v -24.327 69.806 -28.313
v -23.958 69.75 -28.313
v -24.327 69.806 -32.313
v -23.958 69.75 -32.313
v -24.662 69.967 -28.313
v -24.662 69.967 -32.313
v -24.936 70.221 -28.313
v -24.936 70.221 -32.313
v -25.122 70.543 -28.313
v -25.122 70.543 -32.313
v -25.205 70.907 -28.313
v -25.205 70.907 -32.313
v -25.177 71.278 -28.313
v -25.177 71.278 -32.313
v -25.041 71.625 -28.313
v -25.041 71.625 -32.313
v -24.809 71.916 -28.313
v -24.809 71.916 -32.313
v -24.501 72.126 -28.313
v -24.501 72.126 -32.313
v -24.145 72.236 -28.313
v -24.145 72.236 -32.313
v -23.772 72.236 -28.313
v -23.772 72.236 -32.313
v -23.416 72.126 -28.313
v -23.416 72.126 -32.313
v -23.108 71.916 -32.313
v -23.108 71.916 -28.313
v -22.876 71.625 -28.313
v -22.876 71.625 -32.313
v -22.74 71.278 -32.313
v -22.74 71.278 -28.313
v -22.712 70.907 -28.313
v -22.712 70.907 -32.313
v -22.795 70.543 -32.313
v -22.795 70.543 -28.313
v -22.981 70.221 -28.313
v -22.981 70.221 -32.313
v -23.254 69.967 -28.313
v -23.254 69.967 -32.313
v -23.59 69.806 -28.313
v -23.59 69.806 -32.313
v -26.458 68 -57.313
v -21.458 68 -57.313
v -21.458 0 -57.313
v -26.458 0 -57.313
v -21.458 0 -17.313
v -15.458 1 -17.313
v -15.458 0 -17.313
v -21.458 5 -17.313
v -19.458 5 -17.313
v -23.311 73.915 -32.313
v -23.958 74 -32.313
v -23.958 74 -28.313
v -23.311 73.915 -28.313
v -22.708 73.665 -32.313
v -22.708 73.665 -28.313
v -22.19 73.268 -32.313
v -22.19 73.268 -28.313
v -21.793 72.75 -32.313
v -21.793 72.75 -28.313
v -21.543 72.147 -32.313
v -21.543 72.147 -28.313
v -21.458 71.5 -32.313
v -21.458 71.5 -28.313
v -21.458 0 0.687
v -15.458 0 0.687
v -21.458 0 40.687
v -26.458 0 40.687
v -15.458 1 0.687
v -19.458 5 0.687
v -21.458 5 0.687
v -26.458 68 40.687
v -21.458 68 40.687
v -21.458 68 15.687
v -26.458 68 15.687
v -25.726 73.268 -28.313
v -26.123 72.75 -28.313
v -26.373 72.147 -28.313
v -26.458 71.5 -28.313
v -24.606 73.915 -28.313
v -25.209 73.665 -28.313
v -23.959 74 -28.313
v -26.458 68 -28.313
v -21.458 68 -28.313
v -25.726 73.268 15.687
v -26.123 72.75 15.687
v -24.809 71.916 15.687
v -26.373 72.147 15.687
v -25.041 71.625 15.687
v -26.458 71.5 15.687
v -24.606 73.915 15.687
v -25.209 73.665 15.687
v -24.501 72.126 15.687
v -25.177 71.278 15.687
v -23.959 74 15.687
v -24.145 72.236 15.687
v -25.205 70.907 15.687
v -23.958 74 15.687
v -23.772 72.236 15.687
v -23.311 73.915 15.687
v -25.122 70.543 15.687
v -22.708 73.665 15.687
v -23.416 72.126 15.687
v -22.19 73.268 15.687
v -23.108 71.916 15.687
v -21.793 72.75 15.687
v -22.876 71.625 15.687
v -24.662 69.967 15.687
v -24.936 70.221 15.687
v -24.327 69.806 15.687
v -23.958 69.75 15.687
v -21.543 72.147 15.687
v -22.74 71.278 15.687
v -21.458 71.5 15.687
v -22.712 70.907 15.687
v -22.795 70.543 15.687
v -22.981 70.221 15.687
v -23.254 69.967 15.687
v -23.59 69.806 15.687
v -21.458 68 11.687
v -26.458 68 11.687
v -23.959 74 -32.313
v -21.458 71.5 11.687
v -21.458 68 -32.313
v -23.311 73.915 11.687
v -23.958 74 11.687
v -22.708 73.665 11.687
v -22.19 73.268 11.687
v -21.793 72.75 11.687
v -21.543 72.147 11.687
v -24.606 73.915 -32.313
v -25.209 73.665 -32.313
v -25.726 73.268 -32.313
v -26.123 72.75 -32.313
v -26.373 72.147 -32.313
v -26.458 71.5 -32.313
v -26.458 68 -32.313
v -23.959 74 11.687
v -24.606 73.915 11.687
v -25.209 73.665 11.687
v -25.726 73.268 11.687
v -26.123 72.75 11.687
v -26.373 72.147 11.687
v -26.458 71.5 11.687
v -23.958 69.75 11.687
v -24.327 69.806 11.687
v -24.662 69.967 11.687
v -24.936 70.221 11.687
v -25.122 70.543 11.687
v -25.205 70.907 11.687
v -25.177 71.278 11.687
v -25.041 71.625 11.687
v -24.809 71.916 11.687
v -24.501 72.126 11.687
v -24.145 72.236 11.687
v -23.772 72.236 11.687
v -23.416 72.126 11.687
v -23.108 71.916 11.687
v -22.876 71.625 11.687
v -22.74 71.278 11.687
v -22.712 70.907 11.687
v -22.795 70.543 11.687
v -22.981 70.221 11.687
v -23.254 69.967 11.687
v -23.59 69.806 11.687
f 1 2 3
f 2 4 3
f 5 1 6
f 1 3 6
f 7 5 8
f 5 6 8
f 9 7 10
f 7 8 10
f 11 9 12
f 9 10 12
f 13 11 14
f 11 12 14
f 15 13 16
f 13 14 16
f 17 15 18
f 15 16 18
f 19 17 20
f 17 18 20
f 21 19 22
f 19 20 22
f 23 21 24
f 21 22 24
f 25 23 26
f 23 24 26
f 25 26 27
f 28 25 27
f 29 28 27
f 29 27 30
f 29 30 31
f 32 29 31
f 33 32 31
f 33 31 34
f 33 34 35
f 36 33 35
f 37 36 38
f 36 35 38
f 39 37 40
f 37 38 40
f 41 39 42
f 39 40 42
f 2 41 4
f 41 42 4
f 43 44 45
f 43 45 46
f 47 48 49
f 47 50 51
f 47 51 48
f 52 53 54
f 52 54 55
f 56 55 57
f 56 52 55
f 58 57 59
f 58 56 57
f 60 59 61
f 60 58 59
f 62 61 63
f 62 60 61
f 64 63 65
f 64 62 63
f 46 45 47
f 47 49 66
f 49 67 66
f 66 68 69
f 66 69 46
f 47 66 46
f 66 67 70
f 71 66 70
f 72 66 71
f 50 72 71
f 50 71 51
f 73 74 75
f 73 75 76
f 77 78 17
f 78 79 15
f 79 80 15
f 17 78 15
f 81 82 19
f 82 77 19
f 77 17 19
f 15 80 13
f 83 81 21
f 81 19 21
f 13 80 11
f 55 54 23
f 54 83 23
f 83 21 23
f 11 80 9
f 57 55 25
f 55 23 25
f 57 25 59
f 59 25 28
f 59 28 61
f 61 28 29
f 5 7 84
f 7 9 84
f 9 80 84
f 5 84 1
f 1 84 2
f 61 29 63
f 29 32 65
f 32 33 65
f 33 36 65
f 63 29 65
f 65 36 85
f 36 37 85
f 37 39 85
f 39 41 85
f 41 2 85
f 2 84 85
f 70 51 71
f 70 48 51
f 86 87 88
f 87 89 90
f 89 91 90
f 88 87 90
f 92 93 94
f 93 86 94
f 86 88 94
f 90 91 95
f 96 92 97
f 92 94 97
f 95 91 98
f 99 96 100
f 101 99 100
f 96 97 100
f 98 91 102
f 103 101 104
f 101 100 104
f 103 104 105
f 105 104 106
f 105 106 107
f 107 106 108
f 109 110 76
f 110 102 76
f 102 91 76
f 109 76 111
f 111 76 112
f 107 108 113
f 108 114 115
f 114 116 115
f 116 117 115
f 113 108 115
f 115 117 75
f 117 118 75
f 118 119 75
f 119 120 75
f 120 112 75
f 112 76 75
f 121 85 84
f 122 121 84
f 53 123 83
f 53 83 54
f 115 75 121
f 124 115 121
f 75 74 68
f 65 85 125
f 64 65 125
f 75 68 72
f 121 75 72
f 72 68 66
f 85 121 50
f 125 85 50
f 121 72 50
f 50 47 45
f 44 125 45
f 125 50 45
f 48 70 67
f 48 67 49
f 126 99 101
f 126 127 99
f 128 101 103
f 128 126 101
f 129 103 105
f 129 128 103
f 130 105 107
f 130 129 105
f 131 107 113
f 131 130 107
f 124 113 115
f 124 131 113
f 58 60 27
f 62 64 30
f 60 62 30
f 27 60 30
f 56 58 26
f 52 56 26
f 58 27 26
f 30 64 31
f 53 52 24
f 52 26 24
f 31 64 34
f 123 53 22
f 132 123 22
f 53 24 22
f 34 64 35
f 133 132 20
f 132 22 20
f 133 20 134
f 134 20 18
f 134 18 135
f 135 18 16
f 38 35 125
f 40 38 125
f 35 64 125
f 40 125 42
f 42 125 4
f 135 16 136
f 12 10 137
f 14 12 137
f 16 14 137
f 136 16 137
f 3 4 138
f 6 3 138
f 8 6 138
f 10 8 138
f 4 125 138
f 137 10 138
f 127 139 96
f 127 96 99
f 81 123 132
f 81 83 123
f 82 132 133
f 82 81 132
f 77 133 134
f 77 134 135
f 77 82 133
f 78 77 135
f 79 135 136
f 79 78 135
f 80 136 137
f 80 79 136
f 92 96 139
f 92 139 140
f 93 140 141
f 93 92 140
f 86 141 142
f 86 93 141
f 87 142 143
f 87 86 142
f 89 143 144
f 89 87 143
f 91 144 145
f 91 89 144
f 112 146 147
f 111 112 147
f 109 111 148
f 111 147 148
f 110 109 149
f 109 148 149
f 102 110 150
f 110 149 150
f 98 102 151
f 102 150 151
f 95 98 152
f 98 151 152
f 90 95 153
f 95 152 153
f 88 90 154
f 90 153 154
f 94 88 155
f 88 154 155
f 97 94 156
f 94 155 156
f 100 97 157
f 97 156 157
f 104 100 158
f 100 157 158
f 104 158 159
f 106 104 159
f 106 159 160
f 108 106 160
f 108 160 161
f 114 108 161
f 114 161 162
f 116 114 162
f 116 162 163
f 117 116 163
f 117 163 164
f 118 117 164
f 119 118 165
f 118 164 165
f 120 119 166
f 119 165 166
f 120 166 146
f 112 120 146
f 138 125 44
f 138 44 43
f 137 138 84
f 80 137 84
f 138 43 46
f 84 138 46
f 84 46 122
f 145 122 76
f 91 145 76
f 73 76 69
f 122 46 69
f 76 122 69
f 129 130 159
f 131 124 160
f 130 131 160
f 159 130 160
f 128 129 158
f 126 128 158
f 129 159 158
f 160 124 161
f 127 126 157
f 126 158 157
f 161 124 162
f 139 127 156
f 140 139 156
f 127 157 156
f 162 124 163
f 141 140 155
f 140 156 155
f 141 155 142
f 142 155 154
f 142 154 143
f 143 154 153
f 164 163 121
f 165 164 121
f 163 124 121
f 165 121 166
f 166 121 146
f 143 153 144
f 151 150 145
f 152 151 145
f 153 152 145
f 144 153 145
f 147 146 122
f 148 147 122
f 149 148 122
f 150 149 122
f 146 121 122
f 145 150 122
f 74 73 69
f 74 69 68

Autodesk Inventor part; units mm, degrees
ref_plane "YZ Plane" through (0, 0, 0) normal (1, 0, 0) x (0, 1, 0)
ref_plane "XZ Plane" through (0, 0, 0) normal (0, 1, 0) x (-1, 0, 0)
ref_plane "XY Plane" through (0, 0, 0) normal (0, 0, 1) x (1, 0, 0)
sketch "Sketch1" plane through (0, 0, 0) normal (0, 1, 0) x (-1, 0, 0)
  line L0 (42.3333, 428.0371) -> (37.3333, 428.0371)
  line L1 (37.3333, 428.0371) -> (37.3333, 330.0371)
  line L2 (37.3333, 330.0371) -> (42.3333, 330.0371)
  line L3 (42.3333, 330.0371) -> (42.3333, 428.0371)
  point P0 (0, 0)
  dimension "d0" = 5
  dimension "d1" = 98
extrude "Extrusion1" add sketch "Sketch1" along normal blind 68
move or copy body "Move Body1" bodies to move or copy 1 copy no translate (15.875, -14.288, -387.35)
sketch "Sketch2" plane through (0, 68, 0) normal (0, 1, 0) x (1, 0, 0)
  line L0 (-26.4583, 57.3129) -> (-26.4583, -40.6871) projected
  line L1 (-21.4583, -40.6871) -> (-21.4583, 57.3129) projected
  line L2 (-26.4583, -15.6871) -> (-21.4583, -15.6871)
  line L3 (-21.4583, -15.6871) -> (-21.4583, -11.6871)
  line L4 (-21.4583, -11.6871) -> (-26.4583, -11.6871)
  line L5 (-26.4583, -11.6871) -> (-26.4583, -15.6871)
  line L6 (-26.4583, 28.3129) -> (-21.4583, 28.3129)
  line L7 (-21.4583, 28.3129) -> (-21.4583, 32.3129)
  line L8 (-21.4583, 32.3129) -> (-26.4583, 32.3129)
  line L9 (-26.4583, 32.3129) -> (-26.4583, 28.3129)
  line L10 (-26.4583, -40.6871) -> (-21.4583, -40.6871) projected
  line L11 (-21.4583, 57.3129) -> (-26.4583, 57.3129) projected
  line L12 (-21.4583, -40.6871) -> (-22.4583, -40.6871)
  line L13 (-22.4583, -40.6871) -> (-22.4583, 57.3129)
  line L14 (-22.4583, 57.3129) -> (-21.4583, 57.3129)
  line L15 (-21.4583, 57.3129) -> (-21.4583, -40.6871)
  point P0 (0, 0)
  point P1 (-26.4583, 32.3129)
  point P2 (-26.4583, 28.3129)
  point P3 (-26.4583, -11.6871)
  dimension "d7" = 29
  dimension "d8" = 29
  dimension "d9" = 25
  dimension "d10" = 25
  dimension "d26" = 1
move or copy body "Move Body2" bodies to move or copy 1 copy no translate (0, 14.288, 0)
extrude "Extrusion2" add sketch "Sketch2" along normal blind 6 contours L8 L13 L6 L0 | L8 L1 L6 L13 | L4 L13 L2 L0 | L4 L1 L2 L13
sketch "Sketch4" plane through (-26.4583, 68, 15.6871) normal (0, 0, 1) x (1, 0, 0)
  line L0 (0, 6) -> (5, 6) projected
  line L1 (5, 0) -> (5, 6) projected
  point P0 (26.4583, -68)
  point P1 (2.5, 3)
  dimension "d17" = 3
  dimension "d18" = 2.5
hole "Hole1" at (-23.9583, 71, 15.6871) direction (0, 0, -1) diameter 2.5 end through all
sketch "Sketch5" plane through (-21.4583, 0, 40.6871) normal (1, 0, 0) x (0, 0, -1)
  line L0 (40, 5) -> (58, 5)
  line L1 (58, 5) -> (58, 0)
  line L2 (58, 0) -> (40, 0)
  line L3 (40, 0) -> (40, 5)
  line L4 (0, 0) -> (98, 0) projected
  line L5 (0, 0) -> (0, 68) projected
  line L6 (98, 0) -> (98, 68) projected
  point P0 (40.6871, 0)
  dimension "d27" = 0
  dimension "d28" = 5
  dimension "d29" = 40
  dimension "d30" = 40
extrude "Extrusion3" add sketch "Sketch5" along normal blind 6
chamfer "Chamfer1" distance 4 angle 45 1 edges at (-15.4583, 5, -8.3129)
fillet "Fillet1" radius 2.5 4 edges at (-21.4583, 74, -30.3129) (-21.4583, 74, 13.6871) (-26.4583, 74, -30.3129) (-26.4583, 74, 13.6871)
properties part number "box_door"
